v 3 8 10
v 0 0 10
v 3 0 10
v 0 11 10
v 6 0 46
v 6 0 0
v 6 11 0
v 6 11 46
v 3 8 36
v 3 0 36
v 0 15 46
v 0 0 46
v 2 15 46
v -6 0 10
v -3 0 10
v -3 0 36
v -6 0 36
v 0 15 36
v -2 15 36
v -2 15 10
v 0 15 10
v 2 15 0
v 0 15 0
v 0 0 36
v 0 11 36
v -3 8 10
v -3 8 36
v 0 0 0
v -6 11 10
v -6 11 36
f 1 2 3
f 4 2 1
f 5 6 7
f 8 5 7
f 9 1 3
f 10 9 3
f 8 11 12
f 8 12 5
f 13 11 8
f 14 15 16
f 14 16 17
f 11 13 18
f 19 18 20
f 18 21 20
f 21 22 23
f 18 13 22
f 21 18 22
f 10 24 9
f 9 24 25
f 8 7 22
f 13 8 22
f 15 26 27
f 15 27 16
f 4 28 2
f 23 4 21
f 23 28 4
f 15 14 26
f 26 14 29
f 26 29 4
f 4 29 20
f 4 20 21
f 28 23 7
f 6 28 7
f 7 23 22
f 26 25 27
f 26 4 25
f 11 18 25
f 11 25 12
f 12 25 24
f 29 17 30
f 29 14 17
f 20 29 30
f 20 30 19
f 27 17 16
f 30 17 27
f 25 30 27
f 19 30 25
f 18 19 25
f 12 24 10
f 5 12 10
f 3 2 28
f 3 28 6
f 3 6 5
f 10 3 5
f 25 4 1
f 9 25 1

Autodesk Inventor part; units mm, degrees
ref_plane "YZ Plane" through (0, 0, 0) normal (1, 0, 0) x (0, 1, 0)
ref_plane "XZ Plane" through (0, 0, 0) normal (0, 1, 0) x (-1, 0, 0)
ref_plane "XY Plane" through (0, 0, 0) normal (0, 0, 1) x (1, 0, 0)
sketch "Sketch1" plane through (0, 0, 0) normal (0, 0, 1) x (1, 0, 0)
  line L0 (0, 0) -> (6, 0)
  line L1 (6, 0) -> (6, 11)
  line L2 (0, 0) -> (0, 15)
  line L3 (0, 15) -> (2, 15)
  line L4 (2, 15) -> (6, 11)
  dimension "d0" = 6
  dimension "d1" = 11
  dimension "d2" = 15
  dimension "d3" = 2
extrude "Extrusion1" add sketch "Sketch1" along normal blind 10
sketch "Sketch2" plane through (0, 0, 10) normal (0, 0, 1) x (1, 0, 0)
  line L0 (0, 15) -> (0, 0) projected
  line L1 (0, 0) -> (6, 0) projected
  line L2 (6, 11) -> (2, 15) projected
  line L3 (0, 11) -> (3, 8)
  line L4 (0, 11) -> (-3, 8)
  line L5 (-3, 8) -> (-3, 0)
  line L6 (2, 15) -> (0, 15) projected
  line L7 (0, 15) -> (2, 15)
  line L8 (6, 0) -> (6, 11) projected
  line L9 (2, 15) -> (6, 11)
  line L10 (6, 11) -> (6, 0)
  line L11 (6, 0) -> (0, 0)
  line L12 (0, 0) -> (-6, 0)
  line L13 (-6, 11) -> (-2, 15)
  line L14 (-2, 15) -> (0, 15)
  line L15 (-6, 0) -> (-6, 11)
  line L16 (3, 8) -> (3, 0)
  line L17 (3, 0) -> (6, 0)
  line L18 (-3, 0) -> (-6, 0)
  line L19 (0, 11) -> (0, 15)
  dimension "d6" = 3
extrude "Extrusion2" add sketch "Sketch2" along normal blind 26 contours L6 L2 L8 L1 L16 L3 L0 | L0 L4 L5 L12 L15 L13 L14
sketch "Sketch3" plane through (0, 0, 36) normal (0, 0, 1) x (1, 0, 0)
  line L0 (2, 15) -> (-2, 15) projected
  line L1 (0, 15) -> (2, 15)
  line L2 (6, 11) -> (2, 15) projected
  line L3 (2, 15) -> (6, 11)
  line L4 (6, 0) -> (6, 11) projected
  line L5 (6, 11) -> (6, 0)
  line L6 (0, 0) -> (6, 0) projected
  line L7 (6, 0) -> (0, 0)
  line L8 (0, 15) -> (0, 11) projected
  line L9 (0, 0) -> (0, 15)
extrude "Extrusion3" add sketch "Sketch3" along normal blind 10
properties part number "outside-join"
